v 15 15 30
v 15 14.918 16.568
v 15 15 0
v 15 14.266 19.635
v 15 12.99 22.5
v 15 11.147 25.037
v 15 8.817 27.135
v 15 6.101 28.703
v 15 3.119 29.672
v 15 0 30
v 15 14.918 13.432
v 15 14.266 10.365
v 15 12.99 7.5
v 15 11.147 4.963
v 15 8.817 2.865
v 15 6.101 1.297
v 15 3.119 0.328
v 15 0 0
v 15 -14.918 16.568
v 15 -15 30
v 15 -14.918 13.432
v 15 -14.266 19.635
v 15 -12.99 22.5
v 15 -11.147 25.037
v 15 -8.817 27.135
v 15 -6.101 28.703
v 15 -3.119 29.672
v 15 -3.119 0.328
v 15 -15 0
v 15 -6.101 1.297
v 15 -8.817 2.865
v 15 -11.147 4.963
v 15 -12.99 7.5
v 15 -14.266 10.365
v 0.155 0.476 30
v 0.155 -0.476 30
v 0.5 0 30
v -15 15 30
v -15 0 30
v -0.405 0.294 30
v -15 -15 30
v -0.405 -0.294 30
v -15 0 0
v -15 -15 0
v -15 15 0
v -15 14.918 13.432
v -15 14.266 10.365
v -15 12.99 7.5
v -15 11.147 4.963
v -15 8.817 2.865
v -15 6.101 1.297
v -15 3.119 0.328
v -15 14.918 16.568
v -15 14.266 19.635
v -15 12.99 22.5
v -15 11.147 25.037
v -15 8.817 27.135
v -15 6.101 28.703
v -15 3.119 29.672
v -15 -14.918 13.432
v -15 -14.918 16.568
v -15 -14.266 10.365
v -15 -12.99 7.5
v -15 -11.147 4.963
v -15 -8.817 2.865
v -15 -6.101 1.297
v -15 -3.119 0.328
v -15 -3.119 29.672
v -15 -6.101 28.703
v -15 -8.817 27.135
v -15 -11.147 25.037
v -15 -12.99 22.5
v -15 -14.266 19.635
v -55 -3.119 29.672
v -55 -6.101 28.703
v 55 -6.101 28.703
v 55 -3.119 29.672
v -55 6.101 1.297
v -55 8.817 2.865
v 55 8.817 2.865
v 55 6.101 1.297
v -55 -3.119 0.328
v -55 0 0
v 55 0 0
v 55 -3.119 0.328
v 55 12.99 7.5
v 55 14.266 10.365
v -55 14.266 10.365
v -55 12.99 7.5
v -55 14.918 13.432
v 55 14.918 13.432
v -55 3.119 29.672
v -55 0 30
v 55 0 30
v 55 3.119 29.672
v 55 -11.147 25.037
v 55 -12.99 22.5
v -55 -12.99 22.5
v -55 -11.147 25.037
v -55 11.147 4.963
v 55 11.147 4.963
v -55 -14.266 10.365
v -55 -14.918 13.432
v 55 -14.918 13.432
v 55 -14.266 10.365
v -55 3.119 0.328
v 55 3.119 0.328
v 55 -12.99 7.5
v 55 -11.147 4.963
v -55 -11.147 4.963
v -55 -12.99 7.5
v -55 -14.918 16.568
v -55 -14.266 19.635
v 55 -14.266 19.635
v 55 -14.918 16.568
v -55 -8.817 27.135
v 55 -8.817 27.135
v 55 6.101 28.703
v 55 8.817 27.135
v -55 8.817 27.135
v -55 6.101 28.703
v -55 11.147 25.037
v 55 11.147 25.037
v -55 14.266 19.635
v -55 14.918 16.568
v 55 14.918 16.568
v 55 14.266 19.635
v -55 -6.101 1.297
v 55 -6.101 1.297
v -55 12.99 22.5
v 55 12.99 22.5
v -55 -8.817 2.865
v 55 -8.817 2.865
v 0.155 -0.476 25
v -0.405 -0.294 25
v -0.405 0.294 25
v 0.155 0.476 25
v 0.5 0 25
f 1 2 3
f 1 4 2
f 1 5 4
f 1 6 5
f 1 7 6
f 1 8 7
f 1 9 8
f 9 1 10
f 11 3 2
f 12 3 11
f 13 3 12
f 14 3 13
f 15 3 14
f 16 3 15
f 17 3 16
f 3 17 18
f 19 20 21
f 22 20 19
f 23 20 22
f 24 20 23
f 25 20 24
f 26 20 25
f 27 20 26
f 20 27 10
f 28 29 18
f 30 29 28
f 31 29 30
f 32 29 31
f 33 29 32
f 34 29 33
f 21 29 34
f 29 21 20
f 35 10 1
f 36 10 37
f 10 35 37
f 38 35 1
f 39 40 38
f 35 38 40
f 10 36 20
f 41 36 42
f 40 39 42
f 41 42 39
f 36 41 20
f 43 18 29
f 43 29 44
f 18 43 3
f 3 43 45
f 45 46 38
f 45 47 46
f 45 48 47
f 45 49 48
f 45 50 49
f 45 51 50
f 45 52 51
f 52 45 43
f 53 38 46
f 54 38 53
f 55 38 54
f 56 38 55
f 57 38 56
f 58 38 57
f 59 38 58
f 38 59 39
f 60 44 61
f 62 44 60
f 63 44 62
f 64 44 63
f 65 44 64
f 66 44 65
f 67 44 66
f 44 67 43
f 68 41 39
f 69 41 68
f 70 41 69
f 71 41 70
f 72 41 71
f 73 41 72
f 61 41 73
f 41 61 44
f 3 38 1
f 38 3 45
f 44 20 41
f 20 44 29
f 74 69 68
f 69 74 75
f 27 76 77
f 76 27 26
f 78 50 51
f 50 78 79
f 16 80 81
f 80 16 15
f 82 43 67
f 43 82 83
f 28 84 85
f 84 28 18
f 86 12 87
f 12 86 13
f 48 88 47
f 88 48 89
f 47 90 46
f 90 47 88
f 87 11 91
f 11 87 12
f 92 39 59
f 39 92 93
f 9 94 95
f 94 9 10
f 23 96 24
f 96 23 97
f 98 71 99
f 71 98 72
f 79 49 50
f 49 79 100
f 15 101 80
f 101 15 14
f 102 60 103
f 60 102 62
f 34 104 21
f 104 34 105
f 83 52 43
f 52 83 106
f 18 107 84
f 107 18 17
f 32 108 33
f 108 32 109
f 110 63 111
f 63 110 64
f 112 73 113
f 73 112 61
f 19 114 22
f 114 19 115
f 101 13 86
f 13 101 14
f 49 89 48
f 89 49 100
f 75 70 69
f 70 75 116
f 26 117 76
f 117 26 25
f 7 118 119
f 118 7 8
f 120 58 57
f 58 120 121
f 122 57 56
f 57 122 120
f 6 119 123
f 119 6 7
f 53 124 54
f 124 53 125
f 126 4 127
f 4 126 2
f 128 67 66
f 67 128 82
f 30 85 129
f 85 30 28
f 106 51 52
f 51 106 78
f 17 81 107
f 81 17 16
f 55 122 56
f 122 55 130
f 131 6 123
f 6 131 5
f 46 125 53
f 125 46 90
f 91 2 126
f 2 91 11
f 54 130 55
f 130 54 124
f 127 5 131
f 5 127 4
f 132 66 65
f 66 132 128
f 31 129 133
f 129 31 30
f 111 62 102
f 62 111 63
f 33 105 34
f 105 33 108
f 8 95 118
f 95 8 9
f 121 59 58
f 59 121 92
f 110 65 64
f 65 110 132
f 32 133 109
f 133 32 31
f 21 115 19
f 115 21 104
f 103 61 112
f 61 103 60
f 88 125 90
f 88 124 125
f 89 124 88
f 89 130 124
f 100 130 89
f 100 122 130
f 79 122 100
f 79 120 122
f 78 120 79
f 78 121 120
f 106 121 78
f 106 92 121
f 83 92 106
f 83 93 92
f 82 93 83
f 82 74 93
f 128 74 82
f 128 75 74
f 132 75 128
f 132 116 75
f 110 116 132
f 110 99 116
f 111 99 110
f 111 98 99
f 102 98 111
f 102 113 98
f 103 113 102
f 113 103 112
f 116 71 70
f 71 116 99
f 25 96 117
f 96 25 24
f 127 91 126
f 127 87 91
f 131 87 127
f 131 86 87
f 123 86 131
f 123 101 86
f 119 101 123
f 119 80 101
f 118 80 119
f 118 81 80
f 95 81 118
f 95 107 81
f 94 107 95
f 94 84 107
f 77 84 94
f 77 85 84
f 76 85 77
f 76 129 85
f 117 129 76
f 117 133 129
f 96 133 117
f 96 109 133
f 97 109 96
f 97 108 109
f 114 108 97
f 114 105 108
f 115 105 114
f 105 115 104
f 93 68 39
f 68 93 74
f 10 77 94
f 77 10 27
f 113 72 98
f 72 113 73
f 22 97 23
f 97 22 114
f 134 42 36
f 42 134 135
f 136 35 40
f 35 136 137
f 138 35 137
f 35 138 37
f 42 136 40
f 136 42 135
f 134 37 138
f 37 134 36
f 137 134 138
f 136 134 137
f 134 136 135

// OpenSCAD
cube_size = 30; // [10:Small,20:Medium,30:Large]

hole_diameter = 1; 
hole_radius = hole_diameter/2;

// How deep should the center hole be?
hole_depth = 5; // [0,1,5,50]

show_wheels = "yes"; // [yes,no]

// How thick should the side wheels be?
wheel_thickness = 40; // [1:40]

// ignore this variable!
// foo=1;

// don't turn functions into params!
function BEZ03(u) = pow((1-u), 3);

// ignore variable values
bing = 3+4;
baz = 3 / hole_depth;

difference() {
  union() {
    translate([0, 0, cube_size/2]) cube([cube_size,cube_size,cube_size], center=true);
    if (show_wheels == "yes") {
      translate([0, 0, cube_size/2]) rotate([0, 90, 0]) {
        cylinder(r=cube_size/2, h=cube_size+(wheel_thickness*2), center=true);
      }
    }
  }
  translate([0, 0, cube_size-hole_depth]) cylinder(r=hole_radius, h=hole_depth);
}
        
